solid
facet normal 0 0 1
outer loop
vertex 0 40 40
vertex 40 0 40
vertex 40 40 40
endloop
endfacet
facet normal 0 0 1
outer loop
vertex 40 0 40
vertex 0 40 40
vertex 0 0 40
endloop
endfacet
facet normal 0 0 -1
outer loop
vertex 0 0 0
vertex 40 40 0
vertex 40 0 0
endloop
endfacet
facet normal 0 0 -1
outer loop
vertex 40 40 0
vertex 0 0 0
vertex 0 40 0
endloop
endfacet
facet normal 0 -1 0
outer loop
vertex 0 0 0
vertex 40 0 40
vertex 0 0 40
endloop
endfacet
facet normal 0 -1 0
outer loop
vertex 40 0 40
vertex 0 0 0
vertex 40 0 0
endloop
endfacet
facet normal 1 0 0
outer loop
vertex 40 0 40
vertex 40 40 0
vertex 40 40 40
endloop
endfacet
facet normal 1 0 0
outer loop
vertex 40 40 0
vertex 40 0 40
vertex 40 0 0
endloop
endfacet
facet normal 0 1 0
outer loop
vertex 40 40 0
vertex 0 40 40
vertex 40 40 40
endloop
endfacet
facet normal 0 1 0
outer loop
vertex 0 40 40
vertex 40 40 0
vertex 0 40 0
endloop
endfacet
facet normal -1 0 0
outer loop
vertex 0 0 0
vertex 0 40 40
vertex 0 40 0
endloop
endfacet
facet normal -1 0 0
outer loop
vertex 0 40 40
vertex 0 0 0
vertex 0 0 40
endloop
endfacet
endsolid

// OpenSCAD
// A 40mm cube for calibration.  Inspired by
// http://www.thingiverse.com/thing:477.

cube(size=[40, 40, 40]);
